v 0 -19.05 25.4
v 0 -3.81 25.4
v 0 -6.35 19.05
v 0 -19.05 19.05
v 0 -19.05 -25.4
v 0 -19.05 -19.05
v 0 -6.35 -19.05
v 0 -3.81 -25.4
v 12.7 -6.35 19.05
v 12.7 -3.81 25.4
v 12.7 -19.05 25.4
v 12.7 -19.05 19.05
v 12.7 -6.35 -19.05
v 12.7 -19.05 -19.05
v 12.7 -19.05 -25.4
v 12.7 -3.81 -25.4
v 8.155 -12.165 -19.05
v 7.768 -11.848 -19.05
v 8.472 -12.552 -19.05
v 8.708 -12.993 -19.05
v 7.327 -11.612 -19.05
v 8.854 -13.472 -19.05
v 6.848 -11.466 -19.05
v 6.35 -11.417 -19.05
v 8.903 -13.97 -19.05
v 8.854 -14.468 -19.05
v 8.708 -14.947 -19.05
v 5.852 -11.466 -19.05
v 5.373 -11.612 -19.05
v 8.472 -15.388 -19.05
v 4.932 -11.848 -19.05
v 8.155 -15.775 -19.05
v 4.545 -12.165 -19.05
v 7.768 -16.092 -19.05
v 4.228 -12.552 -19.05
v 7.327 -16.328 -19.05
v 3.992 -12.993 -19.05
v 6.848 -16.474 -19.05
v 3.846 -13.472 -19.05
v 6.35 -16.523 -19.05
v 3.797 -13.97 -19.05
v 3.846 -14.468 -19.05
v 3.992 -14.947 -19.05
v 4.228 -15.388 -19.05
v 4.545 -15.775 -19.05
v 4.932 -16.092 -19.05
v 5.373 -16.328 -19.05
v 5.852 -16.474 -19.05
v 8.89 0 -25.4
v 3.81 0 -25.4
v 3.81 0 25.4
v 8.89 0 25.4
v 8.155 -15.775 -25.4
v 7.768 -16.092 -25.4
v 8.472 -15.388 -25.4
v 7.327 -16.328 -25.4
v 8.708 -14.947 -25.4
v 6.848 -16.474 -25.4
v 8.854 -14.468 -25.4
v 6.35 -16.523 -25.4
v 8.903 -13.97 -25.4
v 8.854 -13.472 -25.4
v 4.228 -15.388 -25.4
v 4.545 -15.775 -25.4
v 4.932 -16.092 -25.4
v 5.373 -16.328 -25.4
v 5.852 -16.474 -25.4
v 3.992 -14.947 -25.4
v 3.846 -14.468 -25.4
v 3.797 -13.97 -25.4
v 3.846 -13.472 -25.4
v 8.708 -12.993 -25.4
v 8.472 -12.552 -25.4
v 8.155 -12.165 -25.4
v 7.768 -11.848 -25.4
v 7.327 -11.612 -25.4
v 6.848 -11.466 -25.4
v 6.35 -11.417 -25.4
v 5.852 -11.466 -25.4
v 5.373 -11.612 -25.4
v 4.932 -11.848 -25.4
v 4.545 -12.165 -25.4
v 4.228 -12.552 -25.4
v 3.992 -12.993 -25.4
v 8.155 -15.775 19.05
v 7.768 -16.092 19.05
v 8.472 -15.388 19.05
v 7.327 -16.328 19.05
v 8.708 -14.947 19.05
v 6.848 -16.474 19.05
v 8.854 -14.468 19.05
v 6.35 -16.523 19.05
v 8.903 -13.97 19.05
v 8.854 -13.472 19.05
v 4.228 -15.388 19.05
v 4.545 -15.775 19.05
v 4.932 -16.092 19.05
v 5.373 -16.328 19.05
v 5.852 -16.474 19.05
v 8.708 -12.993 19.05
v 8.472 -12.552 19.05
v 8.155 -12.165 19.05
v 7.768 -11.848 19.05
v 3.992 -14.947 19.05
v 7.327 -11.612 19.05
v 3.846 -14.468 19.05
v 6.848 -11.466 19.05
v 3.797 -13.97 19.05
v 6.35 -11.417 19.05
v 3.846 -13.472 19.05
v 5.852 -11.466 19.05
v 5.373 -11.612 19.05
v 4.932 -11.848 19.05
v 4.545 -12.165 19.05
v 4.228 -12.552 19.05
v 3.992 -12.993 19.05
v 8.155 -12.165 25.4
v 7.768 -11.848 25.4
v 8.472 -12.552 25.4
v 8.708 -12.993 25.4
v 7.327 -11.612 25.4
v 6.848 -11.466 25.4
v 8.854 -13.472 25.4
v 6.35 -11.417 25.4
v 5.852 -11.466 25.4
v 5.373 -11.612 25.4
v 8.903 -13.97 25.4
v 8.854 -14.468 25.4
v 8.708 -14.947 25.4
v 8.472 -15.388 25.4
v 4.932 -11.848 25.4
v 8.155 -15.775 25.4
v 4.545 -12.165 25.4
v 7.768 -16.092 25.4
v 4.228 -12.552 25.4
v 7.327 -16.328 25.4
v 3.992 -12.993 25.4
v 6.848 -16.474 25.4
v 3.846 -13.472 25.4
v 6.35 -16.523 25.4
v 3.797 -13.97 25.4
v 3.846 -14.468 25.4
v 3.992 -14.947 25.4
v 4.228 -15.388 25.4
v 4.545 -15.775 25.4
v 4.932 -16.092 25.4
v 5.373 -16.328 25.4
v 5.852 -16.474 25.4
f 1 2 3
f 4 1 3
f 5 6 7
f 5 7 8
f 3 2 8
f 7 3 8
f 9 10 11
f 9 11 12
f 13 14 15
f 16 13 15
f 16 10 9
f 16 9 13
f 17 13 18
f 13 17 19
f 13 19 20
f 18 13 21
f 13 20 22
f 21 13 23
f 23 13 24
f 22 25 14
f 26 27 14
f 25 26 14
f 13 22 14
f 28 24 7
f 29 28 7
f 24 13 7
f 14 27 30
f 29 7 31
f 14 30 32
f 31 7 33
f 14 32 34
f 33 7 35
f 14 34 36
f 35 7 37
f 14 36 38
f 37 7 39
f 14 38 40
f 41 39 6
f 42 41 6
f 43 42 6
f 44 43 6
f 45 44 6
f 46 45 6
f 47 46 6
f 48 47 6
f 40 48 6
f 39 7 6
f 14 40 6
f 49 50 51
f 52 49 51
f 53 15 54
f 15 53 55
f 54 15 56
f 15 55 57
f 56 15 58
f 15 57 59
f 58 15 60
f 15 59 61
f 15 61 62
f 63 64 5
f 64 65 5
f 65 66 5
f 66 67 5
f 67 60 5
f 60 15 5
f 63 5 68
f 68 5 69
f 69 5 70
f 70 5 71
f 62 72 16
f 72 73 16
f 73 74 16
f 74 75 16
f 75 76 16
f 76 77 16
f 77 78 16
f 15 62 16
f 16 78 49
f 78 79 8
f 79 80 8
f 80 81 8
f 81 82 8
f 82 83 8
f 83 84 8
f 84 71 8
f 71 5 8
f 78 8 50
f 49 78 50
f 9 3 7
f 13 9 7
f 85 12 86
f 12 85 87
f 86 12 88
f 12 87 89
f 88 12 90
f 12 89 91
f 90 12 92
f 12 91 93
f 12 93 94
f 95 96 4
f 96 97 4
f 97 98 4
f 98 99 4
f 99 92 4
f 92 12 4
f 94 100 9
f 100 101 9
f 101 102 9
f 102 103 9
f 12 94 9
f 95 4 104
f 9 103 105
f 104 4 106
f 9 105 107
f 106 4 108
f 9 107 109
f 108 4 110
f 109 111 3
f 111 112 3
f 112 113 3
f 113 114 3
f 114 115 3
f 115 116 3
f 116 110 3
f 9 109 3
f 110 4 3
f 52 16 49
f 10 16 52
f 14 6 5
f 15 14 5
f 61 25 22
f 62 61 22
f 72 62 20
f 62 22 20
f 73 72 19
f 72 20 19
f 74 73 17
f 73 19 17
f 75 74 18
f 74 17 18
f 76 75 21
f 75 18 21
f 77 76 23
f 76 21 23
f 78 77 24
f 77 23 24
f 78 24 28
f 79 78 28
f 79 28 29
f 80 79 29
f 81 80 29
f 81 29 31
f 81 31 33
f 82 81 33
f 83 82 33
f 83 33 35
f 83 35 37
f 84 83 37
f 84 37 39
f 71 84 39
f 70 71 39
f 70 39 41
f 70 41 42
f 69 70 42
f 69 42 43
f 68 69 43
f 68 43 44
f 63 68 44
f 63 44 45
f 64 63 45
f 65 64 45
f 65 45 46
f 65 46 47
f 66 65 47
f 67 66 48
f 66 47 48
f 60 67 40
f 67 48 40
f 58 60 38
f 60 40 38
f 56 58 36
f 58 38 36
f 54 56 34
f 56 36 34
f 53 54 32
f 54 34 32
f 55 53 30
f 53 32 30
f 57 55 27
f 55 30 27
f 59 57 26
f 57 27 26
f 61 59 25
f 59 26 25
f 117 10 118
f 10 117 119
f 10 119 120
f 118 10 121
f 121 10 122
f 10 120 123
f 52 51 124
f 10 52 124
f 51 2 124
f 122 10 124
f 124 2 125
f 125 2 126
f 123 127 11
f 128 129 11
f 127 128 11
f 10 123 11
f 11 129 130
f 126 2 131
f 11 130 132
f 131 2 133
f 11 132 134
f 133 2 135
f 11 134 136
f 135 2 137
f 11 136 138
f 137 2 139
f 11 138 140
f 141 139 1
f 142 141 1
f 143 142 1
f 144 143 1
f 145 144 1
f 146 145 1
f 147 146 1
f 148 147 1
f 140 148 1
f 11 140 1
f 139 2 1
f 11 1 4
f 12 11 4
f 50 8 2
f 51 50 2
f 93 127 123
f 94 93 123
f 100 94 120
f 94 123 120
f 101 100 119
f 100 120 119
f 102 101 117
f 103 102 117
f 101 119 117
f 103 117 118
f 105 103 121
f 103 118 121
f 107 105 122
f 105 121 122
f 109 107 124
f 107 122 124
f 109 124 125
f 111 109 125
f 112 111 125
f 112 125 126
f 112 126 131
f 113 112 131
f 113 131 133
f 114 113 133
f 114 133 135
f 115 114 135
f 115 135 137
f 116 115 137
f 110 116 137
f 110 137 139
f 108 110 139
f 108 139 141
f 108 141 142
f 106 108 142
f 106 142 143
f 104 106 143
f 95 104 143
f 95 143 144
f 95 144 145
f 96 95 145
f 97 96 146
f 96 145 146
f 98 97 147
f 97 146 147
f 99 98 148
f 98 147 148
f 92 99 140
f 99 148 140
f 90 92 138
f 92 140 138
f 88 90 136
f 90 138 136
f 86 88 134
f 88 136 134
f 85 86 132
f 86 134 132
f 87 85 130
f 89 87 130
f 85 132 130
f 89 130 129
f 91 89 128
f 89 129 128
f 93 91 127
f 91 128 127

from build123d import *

# Parameters (mm, degrees)
BOSS_EXTRUDE1_DEPTH         = 12.7
TAP_DRILL_FOR_1_4_20_TAP1_D = 5.1054
CHAMFER1_SIZE               = 3.81


with BuildPart() as part:
    # Sketch1 → Boss-Extrude1 (new body)
    with BuildSketch(Plane(origin=(0, 0, 0), x_dir=(0, 0, -1), z_dir=(1, 0, 0))):
        Polygon((25.4, 0), (-25.4, 0), (-25.4, -19.05), (-19.05, -19.05), (-19.05, -6.35), (19.05, -6.35), (19.05, -19.05), (25.4, -19.05), align=None)
    extrude(amount=BOSS_EXTRUDE1_DEPTH)

    # Tap Drill for 1/4-20 Tap1 (through all)
    with Locations(Plane(origin=(6.35, -13.97, -25.4), x_dir=(-1, 0, 0), z_dir=(0, 0, -1))):
        with Locations((0, 0)):
            Hole(TAP_DRILL_FOR_1_4_20_TAP1_D / 2)

    # Chamfer1
    chamfer1_edges = [part.edges().sort_by_distance(p)[0] for p in [
        (12.7, 0, 0),
        (0, 0, 0),
    ]]
    chamfer(chamfer1_edges, length=CHAMFER1_SIZE)


solid = part.part
